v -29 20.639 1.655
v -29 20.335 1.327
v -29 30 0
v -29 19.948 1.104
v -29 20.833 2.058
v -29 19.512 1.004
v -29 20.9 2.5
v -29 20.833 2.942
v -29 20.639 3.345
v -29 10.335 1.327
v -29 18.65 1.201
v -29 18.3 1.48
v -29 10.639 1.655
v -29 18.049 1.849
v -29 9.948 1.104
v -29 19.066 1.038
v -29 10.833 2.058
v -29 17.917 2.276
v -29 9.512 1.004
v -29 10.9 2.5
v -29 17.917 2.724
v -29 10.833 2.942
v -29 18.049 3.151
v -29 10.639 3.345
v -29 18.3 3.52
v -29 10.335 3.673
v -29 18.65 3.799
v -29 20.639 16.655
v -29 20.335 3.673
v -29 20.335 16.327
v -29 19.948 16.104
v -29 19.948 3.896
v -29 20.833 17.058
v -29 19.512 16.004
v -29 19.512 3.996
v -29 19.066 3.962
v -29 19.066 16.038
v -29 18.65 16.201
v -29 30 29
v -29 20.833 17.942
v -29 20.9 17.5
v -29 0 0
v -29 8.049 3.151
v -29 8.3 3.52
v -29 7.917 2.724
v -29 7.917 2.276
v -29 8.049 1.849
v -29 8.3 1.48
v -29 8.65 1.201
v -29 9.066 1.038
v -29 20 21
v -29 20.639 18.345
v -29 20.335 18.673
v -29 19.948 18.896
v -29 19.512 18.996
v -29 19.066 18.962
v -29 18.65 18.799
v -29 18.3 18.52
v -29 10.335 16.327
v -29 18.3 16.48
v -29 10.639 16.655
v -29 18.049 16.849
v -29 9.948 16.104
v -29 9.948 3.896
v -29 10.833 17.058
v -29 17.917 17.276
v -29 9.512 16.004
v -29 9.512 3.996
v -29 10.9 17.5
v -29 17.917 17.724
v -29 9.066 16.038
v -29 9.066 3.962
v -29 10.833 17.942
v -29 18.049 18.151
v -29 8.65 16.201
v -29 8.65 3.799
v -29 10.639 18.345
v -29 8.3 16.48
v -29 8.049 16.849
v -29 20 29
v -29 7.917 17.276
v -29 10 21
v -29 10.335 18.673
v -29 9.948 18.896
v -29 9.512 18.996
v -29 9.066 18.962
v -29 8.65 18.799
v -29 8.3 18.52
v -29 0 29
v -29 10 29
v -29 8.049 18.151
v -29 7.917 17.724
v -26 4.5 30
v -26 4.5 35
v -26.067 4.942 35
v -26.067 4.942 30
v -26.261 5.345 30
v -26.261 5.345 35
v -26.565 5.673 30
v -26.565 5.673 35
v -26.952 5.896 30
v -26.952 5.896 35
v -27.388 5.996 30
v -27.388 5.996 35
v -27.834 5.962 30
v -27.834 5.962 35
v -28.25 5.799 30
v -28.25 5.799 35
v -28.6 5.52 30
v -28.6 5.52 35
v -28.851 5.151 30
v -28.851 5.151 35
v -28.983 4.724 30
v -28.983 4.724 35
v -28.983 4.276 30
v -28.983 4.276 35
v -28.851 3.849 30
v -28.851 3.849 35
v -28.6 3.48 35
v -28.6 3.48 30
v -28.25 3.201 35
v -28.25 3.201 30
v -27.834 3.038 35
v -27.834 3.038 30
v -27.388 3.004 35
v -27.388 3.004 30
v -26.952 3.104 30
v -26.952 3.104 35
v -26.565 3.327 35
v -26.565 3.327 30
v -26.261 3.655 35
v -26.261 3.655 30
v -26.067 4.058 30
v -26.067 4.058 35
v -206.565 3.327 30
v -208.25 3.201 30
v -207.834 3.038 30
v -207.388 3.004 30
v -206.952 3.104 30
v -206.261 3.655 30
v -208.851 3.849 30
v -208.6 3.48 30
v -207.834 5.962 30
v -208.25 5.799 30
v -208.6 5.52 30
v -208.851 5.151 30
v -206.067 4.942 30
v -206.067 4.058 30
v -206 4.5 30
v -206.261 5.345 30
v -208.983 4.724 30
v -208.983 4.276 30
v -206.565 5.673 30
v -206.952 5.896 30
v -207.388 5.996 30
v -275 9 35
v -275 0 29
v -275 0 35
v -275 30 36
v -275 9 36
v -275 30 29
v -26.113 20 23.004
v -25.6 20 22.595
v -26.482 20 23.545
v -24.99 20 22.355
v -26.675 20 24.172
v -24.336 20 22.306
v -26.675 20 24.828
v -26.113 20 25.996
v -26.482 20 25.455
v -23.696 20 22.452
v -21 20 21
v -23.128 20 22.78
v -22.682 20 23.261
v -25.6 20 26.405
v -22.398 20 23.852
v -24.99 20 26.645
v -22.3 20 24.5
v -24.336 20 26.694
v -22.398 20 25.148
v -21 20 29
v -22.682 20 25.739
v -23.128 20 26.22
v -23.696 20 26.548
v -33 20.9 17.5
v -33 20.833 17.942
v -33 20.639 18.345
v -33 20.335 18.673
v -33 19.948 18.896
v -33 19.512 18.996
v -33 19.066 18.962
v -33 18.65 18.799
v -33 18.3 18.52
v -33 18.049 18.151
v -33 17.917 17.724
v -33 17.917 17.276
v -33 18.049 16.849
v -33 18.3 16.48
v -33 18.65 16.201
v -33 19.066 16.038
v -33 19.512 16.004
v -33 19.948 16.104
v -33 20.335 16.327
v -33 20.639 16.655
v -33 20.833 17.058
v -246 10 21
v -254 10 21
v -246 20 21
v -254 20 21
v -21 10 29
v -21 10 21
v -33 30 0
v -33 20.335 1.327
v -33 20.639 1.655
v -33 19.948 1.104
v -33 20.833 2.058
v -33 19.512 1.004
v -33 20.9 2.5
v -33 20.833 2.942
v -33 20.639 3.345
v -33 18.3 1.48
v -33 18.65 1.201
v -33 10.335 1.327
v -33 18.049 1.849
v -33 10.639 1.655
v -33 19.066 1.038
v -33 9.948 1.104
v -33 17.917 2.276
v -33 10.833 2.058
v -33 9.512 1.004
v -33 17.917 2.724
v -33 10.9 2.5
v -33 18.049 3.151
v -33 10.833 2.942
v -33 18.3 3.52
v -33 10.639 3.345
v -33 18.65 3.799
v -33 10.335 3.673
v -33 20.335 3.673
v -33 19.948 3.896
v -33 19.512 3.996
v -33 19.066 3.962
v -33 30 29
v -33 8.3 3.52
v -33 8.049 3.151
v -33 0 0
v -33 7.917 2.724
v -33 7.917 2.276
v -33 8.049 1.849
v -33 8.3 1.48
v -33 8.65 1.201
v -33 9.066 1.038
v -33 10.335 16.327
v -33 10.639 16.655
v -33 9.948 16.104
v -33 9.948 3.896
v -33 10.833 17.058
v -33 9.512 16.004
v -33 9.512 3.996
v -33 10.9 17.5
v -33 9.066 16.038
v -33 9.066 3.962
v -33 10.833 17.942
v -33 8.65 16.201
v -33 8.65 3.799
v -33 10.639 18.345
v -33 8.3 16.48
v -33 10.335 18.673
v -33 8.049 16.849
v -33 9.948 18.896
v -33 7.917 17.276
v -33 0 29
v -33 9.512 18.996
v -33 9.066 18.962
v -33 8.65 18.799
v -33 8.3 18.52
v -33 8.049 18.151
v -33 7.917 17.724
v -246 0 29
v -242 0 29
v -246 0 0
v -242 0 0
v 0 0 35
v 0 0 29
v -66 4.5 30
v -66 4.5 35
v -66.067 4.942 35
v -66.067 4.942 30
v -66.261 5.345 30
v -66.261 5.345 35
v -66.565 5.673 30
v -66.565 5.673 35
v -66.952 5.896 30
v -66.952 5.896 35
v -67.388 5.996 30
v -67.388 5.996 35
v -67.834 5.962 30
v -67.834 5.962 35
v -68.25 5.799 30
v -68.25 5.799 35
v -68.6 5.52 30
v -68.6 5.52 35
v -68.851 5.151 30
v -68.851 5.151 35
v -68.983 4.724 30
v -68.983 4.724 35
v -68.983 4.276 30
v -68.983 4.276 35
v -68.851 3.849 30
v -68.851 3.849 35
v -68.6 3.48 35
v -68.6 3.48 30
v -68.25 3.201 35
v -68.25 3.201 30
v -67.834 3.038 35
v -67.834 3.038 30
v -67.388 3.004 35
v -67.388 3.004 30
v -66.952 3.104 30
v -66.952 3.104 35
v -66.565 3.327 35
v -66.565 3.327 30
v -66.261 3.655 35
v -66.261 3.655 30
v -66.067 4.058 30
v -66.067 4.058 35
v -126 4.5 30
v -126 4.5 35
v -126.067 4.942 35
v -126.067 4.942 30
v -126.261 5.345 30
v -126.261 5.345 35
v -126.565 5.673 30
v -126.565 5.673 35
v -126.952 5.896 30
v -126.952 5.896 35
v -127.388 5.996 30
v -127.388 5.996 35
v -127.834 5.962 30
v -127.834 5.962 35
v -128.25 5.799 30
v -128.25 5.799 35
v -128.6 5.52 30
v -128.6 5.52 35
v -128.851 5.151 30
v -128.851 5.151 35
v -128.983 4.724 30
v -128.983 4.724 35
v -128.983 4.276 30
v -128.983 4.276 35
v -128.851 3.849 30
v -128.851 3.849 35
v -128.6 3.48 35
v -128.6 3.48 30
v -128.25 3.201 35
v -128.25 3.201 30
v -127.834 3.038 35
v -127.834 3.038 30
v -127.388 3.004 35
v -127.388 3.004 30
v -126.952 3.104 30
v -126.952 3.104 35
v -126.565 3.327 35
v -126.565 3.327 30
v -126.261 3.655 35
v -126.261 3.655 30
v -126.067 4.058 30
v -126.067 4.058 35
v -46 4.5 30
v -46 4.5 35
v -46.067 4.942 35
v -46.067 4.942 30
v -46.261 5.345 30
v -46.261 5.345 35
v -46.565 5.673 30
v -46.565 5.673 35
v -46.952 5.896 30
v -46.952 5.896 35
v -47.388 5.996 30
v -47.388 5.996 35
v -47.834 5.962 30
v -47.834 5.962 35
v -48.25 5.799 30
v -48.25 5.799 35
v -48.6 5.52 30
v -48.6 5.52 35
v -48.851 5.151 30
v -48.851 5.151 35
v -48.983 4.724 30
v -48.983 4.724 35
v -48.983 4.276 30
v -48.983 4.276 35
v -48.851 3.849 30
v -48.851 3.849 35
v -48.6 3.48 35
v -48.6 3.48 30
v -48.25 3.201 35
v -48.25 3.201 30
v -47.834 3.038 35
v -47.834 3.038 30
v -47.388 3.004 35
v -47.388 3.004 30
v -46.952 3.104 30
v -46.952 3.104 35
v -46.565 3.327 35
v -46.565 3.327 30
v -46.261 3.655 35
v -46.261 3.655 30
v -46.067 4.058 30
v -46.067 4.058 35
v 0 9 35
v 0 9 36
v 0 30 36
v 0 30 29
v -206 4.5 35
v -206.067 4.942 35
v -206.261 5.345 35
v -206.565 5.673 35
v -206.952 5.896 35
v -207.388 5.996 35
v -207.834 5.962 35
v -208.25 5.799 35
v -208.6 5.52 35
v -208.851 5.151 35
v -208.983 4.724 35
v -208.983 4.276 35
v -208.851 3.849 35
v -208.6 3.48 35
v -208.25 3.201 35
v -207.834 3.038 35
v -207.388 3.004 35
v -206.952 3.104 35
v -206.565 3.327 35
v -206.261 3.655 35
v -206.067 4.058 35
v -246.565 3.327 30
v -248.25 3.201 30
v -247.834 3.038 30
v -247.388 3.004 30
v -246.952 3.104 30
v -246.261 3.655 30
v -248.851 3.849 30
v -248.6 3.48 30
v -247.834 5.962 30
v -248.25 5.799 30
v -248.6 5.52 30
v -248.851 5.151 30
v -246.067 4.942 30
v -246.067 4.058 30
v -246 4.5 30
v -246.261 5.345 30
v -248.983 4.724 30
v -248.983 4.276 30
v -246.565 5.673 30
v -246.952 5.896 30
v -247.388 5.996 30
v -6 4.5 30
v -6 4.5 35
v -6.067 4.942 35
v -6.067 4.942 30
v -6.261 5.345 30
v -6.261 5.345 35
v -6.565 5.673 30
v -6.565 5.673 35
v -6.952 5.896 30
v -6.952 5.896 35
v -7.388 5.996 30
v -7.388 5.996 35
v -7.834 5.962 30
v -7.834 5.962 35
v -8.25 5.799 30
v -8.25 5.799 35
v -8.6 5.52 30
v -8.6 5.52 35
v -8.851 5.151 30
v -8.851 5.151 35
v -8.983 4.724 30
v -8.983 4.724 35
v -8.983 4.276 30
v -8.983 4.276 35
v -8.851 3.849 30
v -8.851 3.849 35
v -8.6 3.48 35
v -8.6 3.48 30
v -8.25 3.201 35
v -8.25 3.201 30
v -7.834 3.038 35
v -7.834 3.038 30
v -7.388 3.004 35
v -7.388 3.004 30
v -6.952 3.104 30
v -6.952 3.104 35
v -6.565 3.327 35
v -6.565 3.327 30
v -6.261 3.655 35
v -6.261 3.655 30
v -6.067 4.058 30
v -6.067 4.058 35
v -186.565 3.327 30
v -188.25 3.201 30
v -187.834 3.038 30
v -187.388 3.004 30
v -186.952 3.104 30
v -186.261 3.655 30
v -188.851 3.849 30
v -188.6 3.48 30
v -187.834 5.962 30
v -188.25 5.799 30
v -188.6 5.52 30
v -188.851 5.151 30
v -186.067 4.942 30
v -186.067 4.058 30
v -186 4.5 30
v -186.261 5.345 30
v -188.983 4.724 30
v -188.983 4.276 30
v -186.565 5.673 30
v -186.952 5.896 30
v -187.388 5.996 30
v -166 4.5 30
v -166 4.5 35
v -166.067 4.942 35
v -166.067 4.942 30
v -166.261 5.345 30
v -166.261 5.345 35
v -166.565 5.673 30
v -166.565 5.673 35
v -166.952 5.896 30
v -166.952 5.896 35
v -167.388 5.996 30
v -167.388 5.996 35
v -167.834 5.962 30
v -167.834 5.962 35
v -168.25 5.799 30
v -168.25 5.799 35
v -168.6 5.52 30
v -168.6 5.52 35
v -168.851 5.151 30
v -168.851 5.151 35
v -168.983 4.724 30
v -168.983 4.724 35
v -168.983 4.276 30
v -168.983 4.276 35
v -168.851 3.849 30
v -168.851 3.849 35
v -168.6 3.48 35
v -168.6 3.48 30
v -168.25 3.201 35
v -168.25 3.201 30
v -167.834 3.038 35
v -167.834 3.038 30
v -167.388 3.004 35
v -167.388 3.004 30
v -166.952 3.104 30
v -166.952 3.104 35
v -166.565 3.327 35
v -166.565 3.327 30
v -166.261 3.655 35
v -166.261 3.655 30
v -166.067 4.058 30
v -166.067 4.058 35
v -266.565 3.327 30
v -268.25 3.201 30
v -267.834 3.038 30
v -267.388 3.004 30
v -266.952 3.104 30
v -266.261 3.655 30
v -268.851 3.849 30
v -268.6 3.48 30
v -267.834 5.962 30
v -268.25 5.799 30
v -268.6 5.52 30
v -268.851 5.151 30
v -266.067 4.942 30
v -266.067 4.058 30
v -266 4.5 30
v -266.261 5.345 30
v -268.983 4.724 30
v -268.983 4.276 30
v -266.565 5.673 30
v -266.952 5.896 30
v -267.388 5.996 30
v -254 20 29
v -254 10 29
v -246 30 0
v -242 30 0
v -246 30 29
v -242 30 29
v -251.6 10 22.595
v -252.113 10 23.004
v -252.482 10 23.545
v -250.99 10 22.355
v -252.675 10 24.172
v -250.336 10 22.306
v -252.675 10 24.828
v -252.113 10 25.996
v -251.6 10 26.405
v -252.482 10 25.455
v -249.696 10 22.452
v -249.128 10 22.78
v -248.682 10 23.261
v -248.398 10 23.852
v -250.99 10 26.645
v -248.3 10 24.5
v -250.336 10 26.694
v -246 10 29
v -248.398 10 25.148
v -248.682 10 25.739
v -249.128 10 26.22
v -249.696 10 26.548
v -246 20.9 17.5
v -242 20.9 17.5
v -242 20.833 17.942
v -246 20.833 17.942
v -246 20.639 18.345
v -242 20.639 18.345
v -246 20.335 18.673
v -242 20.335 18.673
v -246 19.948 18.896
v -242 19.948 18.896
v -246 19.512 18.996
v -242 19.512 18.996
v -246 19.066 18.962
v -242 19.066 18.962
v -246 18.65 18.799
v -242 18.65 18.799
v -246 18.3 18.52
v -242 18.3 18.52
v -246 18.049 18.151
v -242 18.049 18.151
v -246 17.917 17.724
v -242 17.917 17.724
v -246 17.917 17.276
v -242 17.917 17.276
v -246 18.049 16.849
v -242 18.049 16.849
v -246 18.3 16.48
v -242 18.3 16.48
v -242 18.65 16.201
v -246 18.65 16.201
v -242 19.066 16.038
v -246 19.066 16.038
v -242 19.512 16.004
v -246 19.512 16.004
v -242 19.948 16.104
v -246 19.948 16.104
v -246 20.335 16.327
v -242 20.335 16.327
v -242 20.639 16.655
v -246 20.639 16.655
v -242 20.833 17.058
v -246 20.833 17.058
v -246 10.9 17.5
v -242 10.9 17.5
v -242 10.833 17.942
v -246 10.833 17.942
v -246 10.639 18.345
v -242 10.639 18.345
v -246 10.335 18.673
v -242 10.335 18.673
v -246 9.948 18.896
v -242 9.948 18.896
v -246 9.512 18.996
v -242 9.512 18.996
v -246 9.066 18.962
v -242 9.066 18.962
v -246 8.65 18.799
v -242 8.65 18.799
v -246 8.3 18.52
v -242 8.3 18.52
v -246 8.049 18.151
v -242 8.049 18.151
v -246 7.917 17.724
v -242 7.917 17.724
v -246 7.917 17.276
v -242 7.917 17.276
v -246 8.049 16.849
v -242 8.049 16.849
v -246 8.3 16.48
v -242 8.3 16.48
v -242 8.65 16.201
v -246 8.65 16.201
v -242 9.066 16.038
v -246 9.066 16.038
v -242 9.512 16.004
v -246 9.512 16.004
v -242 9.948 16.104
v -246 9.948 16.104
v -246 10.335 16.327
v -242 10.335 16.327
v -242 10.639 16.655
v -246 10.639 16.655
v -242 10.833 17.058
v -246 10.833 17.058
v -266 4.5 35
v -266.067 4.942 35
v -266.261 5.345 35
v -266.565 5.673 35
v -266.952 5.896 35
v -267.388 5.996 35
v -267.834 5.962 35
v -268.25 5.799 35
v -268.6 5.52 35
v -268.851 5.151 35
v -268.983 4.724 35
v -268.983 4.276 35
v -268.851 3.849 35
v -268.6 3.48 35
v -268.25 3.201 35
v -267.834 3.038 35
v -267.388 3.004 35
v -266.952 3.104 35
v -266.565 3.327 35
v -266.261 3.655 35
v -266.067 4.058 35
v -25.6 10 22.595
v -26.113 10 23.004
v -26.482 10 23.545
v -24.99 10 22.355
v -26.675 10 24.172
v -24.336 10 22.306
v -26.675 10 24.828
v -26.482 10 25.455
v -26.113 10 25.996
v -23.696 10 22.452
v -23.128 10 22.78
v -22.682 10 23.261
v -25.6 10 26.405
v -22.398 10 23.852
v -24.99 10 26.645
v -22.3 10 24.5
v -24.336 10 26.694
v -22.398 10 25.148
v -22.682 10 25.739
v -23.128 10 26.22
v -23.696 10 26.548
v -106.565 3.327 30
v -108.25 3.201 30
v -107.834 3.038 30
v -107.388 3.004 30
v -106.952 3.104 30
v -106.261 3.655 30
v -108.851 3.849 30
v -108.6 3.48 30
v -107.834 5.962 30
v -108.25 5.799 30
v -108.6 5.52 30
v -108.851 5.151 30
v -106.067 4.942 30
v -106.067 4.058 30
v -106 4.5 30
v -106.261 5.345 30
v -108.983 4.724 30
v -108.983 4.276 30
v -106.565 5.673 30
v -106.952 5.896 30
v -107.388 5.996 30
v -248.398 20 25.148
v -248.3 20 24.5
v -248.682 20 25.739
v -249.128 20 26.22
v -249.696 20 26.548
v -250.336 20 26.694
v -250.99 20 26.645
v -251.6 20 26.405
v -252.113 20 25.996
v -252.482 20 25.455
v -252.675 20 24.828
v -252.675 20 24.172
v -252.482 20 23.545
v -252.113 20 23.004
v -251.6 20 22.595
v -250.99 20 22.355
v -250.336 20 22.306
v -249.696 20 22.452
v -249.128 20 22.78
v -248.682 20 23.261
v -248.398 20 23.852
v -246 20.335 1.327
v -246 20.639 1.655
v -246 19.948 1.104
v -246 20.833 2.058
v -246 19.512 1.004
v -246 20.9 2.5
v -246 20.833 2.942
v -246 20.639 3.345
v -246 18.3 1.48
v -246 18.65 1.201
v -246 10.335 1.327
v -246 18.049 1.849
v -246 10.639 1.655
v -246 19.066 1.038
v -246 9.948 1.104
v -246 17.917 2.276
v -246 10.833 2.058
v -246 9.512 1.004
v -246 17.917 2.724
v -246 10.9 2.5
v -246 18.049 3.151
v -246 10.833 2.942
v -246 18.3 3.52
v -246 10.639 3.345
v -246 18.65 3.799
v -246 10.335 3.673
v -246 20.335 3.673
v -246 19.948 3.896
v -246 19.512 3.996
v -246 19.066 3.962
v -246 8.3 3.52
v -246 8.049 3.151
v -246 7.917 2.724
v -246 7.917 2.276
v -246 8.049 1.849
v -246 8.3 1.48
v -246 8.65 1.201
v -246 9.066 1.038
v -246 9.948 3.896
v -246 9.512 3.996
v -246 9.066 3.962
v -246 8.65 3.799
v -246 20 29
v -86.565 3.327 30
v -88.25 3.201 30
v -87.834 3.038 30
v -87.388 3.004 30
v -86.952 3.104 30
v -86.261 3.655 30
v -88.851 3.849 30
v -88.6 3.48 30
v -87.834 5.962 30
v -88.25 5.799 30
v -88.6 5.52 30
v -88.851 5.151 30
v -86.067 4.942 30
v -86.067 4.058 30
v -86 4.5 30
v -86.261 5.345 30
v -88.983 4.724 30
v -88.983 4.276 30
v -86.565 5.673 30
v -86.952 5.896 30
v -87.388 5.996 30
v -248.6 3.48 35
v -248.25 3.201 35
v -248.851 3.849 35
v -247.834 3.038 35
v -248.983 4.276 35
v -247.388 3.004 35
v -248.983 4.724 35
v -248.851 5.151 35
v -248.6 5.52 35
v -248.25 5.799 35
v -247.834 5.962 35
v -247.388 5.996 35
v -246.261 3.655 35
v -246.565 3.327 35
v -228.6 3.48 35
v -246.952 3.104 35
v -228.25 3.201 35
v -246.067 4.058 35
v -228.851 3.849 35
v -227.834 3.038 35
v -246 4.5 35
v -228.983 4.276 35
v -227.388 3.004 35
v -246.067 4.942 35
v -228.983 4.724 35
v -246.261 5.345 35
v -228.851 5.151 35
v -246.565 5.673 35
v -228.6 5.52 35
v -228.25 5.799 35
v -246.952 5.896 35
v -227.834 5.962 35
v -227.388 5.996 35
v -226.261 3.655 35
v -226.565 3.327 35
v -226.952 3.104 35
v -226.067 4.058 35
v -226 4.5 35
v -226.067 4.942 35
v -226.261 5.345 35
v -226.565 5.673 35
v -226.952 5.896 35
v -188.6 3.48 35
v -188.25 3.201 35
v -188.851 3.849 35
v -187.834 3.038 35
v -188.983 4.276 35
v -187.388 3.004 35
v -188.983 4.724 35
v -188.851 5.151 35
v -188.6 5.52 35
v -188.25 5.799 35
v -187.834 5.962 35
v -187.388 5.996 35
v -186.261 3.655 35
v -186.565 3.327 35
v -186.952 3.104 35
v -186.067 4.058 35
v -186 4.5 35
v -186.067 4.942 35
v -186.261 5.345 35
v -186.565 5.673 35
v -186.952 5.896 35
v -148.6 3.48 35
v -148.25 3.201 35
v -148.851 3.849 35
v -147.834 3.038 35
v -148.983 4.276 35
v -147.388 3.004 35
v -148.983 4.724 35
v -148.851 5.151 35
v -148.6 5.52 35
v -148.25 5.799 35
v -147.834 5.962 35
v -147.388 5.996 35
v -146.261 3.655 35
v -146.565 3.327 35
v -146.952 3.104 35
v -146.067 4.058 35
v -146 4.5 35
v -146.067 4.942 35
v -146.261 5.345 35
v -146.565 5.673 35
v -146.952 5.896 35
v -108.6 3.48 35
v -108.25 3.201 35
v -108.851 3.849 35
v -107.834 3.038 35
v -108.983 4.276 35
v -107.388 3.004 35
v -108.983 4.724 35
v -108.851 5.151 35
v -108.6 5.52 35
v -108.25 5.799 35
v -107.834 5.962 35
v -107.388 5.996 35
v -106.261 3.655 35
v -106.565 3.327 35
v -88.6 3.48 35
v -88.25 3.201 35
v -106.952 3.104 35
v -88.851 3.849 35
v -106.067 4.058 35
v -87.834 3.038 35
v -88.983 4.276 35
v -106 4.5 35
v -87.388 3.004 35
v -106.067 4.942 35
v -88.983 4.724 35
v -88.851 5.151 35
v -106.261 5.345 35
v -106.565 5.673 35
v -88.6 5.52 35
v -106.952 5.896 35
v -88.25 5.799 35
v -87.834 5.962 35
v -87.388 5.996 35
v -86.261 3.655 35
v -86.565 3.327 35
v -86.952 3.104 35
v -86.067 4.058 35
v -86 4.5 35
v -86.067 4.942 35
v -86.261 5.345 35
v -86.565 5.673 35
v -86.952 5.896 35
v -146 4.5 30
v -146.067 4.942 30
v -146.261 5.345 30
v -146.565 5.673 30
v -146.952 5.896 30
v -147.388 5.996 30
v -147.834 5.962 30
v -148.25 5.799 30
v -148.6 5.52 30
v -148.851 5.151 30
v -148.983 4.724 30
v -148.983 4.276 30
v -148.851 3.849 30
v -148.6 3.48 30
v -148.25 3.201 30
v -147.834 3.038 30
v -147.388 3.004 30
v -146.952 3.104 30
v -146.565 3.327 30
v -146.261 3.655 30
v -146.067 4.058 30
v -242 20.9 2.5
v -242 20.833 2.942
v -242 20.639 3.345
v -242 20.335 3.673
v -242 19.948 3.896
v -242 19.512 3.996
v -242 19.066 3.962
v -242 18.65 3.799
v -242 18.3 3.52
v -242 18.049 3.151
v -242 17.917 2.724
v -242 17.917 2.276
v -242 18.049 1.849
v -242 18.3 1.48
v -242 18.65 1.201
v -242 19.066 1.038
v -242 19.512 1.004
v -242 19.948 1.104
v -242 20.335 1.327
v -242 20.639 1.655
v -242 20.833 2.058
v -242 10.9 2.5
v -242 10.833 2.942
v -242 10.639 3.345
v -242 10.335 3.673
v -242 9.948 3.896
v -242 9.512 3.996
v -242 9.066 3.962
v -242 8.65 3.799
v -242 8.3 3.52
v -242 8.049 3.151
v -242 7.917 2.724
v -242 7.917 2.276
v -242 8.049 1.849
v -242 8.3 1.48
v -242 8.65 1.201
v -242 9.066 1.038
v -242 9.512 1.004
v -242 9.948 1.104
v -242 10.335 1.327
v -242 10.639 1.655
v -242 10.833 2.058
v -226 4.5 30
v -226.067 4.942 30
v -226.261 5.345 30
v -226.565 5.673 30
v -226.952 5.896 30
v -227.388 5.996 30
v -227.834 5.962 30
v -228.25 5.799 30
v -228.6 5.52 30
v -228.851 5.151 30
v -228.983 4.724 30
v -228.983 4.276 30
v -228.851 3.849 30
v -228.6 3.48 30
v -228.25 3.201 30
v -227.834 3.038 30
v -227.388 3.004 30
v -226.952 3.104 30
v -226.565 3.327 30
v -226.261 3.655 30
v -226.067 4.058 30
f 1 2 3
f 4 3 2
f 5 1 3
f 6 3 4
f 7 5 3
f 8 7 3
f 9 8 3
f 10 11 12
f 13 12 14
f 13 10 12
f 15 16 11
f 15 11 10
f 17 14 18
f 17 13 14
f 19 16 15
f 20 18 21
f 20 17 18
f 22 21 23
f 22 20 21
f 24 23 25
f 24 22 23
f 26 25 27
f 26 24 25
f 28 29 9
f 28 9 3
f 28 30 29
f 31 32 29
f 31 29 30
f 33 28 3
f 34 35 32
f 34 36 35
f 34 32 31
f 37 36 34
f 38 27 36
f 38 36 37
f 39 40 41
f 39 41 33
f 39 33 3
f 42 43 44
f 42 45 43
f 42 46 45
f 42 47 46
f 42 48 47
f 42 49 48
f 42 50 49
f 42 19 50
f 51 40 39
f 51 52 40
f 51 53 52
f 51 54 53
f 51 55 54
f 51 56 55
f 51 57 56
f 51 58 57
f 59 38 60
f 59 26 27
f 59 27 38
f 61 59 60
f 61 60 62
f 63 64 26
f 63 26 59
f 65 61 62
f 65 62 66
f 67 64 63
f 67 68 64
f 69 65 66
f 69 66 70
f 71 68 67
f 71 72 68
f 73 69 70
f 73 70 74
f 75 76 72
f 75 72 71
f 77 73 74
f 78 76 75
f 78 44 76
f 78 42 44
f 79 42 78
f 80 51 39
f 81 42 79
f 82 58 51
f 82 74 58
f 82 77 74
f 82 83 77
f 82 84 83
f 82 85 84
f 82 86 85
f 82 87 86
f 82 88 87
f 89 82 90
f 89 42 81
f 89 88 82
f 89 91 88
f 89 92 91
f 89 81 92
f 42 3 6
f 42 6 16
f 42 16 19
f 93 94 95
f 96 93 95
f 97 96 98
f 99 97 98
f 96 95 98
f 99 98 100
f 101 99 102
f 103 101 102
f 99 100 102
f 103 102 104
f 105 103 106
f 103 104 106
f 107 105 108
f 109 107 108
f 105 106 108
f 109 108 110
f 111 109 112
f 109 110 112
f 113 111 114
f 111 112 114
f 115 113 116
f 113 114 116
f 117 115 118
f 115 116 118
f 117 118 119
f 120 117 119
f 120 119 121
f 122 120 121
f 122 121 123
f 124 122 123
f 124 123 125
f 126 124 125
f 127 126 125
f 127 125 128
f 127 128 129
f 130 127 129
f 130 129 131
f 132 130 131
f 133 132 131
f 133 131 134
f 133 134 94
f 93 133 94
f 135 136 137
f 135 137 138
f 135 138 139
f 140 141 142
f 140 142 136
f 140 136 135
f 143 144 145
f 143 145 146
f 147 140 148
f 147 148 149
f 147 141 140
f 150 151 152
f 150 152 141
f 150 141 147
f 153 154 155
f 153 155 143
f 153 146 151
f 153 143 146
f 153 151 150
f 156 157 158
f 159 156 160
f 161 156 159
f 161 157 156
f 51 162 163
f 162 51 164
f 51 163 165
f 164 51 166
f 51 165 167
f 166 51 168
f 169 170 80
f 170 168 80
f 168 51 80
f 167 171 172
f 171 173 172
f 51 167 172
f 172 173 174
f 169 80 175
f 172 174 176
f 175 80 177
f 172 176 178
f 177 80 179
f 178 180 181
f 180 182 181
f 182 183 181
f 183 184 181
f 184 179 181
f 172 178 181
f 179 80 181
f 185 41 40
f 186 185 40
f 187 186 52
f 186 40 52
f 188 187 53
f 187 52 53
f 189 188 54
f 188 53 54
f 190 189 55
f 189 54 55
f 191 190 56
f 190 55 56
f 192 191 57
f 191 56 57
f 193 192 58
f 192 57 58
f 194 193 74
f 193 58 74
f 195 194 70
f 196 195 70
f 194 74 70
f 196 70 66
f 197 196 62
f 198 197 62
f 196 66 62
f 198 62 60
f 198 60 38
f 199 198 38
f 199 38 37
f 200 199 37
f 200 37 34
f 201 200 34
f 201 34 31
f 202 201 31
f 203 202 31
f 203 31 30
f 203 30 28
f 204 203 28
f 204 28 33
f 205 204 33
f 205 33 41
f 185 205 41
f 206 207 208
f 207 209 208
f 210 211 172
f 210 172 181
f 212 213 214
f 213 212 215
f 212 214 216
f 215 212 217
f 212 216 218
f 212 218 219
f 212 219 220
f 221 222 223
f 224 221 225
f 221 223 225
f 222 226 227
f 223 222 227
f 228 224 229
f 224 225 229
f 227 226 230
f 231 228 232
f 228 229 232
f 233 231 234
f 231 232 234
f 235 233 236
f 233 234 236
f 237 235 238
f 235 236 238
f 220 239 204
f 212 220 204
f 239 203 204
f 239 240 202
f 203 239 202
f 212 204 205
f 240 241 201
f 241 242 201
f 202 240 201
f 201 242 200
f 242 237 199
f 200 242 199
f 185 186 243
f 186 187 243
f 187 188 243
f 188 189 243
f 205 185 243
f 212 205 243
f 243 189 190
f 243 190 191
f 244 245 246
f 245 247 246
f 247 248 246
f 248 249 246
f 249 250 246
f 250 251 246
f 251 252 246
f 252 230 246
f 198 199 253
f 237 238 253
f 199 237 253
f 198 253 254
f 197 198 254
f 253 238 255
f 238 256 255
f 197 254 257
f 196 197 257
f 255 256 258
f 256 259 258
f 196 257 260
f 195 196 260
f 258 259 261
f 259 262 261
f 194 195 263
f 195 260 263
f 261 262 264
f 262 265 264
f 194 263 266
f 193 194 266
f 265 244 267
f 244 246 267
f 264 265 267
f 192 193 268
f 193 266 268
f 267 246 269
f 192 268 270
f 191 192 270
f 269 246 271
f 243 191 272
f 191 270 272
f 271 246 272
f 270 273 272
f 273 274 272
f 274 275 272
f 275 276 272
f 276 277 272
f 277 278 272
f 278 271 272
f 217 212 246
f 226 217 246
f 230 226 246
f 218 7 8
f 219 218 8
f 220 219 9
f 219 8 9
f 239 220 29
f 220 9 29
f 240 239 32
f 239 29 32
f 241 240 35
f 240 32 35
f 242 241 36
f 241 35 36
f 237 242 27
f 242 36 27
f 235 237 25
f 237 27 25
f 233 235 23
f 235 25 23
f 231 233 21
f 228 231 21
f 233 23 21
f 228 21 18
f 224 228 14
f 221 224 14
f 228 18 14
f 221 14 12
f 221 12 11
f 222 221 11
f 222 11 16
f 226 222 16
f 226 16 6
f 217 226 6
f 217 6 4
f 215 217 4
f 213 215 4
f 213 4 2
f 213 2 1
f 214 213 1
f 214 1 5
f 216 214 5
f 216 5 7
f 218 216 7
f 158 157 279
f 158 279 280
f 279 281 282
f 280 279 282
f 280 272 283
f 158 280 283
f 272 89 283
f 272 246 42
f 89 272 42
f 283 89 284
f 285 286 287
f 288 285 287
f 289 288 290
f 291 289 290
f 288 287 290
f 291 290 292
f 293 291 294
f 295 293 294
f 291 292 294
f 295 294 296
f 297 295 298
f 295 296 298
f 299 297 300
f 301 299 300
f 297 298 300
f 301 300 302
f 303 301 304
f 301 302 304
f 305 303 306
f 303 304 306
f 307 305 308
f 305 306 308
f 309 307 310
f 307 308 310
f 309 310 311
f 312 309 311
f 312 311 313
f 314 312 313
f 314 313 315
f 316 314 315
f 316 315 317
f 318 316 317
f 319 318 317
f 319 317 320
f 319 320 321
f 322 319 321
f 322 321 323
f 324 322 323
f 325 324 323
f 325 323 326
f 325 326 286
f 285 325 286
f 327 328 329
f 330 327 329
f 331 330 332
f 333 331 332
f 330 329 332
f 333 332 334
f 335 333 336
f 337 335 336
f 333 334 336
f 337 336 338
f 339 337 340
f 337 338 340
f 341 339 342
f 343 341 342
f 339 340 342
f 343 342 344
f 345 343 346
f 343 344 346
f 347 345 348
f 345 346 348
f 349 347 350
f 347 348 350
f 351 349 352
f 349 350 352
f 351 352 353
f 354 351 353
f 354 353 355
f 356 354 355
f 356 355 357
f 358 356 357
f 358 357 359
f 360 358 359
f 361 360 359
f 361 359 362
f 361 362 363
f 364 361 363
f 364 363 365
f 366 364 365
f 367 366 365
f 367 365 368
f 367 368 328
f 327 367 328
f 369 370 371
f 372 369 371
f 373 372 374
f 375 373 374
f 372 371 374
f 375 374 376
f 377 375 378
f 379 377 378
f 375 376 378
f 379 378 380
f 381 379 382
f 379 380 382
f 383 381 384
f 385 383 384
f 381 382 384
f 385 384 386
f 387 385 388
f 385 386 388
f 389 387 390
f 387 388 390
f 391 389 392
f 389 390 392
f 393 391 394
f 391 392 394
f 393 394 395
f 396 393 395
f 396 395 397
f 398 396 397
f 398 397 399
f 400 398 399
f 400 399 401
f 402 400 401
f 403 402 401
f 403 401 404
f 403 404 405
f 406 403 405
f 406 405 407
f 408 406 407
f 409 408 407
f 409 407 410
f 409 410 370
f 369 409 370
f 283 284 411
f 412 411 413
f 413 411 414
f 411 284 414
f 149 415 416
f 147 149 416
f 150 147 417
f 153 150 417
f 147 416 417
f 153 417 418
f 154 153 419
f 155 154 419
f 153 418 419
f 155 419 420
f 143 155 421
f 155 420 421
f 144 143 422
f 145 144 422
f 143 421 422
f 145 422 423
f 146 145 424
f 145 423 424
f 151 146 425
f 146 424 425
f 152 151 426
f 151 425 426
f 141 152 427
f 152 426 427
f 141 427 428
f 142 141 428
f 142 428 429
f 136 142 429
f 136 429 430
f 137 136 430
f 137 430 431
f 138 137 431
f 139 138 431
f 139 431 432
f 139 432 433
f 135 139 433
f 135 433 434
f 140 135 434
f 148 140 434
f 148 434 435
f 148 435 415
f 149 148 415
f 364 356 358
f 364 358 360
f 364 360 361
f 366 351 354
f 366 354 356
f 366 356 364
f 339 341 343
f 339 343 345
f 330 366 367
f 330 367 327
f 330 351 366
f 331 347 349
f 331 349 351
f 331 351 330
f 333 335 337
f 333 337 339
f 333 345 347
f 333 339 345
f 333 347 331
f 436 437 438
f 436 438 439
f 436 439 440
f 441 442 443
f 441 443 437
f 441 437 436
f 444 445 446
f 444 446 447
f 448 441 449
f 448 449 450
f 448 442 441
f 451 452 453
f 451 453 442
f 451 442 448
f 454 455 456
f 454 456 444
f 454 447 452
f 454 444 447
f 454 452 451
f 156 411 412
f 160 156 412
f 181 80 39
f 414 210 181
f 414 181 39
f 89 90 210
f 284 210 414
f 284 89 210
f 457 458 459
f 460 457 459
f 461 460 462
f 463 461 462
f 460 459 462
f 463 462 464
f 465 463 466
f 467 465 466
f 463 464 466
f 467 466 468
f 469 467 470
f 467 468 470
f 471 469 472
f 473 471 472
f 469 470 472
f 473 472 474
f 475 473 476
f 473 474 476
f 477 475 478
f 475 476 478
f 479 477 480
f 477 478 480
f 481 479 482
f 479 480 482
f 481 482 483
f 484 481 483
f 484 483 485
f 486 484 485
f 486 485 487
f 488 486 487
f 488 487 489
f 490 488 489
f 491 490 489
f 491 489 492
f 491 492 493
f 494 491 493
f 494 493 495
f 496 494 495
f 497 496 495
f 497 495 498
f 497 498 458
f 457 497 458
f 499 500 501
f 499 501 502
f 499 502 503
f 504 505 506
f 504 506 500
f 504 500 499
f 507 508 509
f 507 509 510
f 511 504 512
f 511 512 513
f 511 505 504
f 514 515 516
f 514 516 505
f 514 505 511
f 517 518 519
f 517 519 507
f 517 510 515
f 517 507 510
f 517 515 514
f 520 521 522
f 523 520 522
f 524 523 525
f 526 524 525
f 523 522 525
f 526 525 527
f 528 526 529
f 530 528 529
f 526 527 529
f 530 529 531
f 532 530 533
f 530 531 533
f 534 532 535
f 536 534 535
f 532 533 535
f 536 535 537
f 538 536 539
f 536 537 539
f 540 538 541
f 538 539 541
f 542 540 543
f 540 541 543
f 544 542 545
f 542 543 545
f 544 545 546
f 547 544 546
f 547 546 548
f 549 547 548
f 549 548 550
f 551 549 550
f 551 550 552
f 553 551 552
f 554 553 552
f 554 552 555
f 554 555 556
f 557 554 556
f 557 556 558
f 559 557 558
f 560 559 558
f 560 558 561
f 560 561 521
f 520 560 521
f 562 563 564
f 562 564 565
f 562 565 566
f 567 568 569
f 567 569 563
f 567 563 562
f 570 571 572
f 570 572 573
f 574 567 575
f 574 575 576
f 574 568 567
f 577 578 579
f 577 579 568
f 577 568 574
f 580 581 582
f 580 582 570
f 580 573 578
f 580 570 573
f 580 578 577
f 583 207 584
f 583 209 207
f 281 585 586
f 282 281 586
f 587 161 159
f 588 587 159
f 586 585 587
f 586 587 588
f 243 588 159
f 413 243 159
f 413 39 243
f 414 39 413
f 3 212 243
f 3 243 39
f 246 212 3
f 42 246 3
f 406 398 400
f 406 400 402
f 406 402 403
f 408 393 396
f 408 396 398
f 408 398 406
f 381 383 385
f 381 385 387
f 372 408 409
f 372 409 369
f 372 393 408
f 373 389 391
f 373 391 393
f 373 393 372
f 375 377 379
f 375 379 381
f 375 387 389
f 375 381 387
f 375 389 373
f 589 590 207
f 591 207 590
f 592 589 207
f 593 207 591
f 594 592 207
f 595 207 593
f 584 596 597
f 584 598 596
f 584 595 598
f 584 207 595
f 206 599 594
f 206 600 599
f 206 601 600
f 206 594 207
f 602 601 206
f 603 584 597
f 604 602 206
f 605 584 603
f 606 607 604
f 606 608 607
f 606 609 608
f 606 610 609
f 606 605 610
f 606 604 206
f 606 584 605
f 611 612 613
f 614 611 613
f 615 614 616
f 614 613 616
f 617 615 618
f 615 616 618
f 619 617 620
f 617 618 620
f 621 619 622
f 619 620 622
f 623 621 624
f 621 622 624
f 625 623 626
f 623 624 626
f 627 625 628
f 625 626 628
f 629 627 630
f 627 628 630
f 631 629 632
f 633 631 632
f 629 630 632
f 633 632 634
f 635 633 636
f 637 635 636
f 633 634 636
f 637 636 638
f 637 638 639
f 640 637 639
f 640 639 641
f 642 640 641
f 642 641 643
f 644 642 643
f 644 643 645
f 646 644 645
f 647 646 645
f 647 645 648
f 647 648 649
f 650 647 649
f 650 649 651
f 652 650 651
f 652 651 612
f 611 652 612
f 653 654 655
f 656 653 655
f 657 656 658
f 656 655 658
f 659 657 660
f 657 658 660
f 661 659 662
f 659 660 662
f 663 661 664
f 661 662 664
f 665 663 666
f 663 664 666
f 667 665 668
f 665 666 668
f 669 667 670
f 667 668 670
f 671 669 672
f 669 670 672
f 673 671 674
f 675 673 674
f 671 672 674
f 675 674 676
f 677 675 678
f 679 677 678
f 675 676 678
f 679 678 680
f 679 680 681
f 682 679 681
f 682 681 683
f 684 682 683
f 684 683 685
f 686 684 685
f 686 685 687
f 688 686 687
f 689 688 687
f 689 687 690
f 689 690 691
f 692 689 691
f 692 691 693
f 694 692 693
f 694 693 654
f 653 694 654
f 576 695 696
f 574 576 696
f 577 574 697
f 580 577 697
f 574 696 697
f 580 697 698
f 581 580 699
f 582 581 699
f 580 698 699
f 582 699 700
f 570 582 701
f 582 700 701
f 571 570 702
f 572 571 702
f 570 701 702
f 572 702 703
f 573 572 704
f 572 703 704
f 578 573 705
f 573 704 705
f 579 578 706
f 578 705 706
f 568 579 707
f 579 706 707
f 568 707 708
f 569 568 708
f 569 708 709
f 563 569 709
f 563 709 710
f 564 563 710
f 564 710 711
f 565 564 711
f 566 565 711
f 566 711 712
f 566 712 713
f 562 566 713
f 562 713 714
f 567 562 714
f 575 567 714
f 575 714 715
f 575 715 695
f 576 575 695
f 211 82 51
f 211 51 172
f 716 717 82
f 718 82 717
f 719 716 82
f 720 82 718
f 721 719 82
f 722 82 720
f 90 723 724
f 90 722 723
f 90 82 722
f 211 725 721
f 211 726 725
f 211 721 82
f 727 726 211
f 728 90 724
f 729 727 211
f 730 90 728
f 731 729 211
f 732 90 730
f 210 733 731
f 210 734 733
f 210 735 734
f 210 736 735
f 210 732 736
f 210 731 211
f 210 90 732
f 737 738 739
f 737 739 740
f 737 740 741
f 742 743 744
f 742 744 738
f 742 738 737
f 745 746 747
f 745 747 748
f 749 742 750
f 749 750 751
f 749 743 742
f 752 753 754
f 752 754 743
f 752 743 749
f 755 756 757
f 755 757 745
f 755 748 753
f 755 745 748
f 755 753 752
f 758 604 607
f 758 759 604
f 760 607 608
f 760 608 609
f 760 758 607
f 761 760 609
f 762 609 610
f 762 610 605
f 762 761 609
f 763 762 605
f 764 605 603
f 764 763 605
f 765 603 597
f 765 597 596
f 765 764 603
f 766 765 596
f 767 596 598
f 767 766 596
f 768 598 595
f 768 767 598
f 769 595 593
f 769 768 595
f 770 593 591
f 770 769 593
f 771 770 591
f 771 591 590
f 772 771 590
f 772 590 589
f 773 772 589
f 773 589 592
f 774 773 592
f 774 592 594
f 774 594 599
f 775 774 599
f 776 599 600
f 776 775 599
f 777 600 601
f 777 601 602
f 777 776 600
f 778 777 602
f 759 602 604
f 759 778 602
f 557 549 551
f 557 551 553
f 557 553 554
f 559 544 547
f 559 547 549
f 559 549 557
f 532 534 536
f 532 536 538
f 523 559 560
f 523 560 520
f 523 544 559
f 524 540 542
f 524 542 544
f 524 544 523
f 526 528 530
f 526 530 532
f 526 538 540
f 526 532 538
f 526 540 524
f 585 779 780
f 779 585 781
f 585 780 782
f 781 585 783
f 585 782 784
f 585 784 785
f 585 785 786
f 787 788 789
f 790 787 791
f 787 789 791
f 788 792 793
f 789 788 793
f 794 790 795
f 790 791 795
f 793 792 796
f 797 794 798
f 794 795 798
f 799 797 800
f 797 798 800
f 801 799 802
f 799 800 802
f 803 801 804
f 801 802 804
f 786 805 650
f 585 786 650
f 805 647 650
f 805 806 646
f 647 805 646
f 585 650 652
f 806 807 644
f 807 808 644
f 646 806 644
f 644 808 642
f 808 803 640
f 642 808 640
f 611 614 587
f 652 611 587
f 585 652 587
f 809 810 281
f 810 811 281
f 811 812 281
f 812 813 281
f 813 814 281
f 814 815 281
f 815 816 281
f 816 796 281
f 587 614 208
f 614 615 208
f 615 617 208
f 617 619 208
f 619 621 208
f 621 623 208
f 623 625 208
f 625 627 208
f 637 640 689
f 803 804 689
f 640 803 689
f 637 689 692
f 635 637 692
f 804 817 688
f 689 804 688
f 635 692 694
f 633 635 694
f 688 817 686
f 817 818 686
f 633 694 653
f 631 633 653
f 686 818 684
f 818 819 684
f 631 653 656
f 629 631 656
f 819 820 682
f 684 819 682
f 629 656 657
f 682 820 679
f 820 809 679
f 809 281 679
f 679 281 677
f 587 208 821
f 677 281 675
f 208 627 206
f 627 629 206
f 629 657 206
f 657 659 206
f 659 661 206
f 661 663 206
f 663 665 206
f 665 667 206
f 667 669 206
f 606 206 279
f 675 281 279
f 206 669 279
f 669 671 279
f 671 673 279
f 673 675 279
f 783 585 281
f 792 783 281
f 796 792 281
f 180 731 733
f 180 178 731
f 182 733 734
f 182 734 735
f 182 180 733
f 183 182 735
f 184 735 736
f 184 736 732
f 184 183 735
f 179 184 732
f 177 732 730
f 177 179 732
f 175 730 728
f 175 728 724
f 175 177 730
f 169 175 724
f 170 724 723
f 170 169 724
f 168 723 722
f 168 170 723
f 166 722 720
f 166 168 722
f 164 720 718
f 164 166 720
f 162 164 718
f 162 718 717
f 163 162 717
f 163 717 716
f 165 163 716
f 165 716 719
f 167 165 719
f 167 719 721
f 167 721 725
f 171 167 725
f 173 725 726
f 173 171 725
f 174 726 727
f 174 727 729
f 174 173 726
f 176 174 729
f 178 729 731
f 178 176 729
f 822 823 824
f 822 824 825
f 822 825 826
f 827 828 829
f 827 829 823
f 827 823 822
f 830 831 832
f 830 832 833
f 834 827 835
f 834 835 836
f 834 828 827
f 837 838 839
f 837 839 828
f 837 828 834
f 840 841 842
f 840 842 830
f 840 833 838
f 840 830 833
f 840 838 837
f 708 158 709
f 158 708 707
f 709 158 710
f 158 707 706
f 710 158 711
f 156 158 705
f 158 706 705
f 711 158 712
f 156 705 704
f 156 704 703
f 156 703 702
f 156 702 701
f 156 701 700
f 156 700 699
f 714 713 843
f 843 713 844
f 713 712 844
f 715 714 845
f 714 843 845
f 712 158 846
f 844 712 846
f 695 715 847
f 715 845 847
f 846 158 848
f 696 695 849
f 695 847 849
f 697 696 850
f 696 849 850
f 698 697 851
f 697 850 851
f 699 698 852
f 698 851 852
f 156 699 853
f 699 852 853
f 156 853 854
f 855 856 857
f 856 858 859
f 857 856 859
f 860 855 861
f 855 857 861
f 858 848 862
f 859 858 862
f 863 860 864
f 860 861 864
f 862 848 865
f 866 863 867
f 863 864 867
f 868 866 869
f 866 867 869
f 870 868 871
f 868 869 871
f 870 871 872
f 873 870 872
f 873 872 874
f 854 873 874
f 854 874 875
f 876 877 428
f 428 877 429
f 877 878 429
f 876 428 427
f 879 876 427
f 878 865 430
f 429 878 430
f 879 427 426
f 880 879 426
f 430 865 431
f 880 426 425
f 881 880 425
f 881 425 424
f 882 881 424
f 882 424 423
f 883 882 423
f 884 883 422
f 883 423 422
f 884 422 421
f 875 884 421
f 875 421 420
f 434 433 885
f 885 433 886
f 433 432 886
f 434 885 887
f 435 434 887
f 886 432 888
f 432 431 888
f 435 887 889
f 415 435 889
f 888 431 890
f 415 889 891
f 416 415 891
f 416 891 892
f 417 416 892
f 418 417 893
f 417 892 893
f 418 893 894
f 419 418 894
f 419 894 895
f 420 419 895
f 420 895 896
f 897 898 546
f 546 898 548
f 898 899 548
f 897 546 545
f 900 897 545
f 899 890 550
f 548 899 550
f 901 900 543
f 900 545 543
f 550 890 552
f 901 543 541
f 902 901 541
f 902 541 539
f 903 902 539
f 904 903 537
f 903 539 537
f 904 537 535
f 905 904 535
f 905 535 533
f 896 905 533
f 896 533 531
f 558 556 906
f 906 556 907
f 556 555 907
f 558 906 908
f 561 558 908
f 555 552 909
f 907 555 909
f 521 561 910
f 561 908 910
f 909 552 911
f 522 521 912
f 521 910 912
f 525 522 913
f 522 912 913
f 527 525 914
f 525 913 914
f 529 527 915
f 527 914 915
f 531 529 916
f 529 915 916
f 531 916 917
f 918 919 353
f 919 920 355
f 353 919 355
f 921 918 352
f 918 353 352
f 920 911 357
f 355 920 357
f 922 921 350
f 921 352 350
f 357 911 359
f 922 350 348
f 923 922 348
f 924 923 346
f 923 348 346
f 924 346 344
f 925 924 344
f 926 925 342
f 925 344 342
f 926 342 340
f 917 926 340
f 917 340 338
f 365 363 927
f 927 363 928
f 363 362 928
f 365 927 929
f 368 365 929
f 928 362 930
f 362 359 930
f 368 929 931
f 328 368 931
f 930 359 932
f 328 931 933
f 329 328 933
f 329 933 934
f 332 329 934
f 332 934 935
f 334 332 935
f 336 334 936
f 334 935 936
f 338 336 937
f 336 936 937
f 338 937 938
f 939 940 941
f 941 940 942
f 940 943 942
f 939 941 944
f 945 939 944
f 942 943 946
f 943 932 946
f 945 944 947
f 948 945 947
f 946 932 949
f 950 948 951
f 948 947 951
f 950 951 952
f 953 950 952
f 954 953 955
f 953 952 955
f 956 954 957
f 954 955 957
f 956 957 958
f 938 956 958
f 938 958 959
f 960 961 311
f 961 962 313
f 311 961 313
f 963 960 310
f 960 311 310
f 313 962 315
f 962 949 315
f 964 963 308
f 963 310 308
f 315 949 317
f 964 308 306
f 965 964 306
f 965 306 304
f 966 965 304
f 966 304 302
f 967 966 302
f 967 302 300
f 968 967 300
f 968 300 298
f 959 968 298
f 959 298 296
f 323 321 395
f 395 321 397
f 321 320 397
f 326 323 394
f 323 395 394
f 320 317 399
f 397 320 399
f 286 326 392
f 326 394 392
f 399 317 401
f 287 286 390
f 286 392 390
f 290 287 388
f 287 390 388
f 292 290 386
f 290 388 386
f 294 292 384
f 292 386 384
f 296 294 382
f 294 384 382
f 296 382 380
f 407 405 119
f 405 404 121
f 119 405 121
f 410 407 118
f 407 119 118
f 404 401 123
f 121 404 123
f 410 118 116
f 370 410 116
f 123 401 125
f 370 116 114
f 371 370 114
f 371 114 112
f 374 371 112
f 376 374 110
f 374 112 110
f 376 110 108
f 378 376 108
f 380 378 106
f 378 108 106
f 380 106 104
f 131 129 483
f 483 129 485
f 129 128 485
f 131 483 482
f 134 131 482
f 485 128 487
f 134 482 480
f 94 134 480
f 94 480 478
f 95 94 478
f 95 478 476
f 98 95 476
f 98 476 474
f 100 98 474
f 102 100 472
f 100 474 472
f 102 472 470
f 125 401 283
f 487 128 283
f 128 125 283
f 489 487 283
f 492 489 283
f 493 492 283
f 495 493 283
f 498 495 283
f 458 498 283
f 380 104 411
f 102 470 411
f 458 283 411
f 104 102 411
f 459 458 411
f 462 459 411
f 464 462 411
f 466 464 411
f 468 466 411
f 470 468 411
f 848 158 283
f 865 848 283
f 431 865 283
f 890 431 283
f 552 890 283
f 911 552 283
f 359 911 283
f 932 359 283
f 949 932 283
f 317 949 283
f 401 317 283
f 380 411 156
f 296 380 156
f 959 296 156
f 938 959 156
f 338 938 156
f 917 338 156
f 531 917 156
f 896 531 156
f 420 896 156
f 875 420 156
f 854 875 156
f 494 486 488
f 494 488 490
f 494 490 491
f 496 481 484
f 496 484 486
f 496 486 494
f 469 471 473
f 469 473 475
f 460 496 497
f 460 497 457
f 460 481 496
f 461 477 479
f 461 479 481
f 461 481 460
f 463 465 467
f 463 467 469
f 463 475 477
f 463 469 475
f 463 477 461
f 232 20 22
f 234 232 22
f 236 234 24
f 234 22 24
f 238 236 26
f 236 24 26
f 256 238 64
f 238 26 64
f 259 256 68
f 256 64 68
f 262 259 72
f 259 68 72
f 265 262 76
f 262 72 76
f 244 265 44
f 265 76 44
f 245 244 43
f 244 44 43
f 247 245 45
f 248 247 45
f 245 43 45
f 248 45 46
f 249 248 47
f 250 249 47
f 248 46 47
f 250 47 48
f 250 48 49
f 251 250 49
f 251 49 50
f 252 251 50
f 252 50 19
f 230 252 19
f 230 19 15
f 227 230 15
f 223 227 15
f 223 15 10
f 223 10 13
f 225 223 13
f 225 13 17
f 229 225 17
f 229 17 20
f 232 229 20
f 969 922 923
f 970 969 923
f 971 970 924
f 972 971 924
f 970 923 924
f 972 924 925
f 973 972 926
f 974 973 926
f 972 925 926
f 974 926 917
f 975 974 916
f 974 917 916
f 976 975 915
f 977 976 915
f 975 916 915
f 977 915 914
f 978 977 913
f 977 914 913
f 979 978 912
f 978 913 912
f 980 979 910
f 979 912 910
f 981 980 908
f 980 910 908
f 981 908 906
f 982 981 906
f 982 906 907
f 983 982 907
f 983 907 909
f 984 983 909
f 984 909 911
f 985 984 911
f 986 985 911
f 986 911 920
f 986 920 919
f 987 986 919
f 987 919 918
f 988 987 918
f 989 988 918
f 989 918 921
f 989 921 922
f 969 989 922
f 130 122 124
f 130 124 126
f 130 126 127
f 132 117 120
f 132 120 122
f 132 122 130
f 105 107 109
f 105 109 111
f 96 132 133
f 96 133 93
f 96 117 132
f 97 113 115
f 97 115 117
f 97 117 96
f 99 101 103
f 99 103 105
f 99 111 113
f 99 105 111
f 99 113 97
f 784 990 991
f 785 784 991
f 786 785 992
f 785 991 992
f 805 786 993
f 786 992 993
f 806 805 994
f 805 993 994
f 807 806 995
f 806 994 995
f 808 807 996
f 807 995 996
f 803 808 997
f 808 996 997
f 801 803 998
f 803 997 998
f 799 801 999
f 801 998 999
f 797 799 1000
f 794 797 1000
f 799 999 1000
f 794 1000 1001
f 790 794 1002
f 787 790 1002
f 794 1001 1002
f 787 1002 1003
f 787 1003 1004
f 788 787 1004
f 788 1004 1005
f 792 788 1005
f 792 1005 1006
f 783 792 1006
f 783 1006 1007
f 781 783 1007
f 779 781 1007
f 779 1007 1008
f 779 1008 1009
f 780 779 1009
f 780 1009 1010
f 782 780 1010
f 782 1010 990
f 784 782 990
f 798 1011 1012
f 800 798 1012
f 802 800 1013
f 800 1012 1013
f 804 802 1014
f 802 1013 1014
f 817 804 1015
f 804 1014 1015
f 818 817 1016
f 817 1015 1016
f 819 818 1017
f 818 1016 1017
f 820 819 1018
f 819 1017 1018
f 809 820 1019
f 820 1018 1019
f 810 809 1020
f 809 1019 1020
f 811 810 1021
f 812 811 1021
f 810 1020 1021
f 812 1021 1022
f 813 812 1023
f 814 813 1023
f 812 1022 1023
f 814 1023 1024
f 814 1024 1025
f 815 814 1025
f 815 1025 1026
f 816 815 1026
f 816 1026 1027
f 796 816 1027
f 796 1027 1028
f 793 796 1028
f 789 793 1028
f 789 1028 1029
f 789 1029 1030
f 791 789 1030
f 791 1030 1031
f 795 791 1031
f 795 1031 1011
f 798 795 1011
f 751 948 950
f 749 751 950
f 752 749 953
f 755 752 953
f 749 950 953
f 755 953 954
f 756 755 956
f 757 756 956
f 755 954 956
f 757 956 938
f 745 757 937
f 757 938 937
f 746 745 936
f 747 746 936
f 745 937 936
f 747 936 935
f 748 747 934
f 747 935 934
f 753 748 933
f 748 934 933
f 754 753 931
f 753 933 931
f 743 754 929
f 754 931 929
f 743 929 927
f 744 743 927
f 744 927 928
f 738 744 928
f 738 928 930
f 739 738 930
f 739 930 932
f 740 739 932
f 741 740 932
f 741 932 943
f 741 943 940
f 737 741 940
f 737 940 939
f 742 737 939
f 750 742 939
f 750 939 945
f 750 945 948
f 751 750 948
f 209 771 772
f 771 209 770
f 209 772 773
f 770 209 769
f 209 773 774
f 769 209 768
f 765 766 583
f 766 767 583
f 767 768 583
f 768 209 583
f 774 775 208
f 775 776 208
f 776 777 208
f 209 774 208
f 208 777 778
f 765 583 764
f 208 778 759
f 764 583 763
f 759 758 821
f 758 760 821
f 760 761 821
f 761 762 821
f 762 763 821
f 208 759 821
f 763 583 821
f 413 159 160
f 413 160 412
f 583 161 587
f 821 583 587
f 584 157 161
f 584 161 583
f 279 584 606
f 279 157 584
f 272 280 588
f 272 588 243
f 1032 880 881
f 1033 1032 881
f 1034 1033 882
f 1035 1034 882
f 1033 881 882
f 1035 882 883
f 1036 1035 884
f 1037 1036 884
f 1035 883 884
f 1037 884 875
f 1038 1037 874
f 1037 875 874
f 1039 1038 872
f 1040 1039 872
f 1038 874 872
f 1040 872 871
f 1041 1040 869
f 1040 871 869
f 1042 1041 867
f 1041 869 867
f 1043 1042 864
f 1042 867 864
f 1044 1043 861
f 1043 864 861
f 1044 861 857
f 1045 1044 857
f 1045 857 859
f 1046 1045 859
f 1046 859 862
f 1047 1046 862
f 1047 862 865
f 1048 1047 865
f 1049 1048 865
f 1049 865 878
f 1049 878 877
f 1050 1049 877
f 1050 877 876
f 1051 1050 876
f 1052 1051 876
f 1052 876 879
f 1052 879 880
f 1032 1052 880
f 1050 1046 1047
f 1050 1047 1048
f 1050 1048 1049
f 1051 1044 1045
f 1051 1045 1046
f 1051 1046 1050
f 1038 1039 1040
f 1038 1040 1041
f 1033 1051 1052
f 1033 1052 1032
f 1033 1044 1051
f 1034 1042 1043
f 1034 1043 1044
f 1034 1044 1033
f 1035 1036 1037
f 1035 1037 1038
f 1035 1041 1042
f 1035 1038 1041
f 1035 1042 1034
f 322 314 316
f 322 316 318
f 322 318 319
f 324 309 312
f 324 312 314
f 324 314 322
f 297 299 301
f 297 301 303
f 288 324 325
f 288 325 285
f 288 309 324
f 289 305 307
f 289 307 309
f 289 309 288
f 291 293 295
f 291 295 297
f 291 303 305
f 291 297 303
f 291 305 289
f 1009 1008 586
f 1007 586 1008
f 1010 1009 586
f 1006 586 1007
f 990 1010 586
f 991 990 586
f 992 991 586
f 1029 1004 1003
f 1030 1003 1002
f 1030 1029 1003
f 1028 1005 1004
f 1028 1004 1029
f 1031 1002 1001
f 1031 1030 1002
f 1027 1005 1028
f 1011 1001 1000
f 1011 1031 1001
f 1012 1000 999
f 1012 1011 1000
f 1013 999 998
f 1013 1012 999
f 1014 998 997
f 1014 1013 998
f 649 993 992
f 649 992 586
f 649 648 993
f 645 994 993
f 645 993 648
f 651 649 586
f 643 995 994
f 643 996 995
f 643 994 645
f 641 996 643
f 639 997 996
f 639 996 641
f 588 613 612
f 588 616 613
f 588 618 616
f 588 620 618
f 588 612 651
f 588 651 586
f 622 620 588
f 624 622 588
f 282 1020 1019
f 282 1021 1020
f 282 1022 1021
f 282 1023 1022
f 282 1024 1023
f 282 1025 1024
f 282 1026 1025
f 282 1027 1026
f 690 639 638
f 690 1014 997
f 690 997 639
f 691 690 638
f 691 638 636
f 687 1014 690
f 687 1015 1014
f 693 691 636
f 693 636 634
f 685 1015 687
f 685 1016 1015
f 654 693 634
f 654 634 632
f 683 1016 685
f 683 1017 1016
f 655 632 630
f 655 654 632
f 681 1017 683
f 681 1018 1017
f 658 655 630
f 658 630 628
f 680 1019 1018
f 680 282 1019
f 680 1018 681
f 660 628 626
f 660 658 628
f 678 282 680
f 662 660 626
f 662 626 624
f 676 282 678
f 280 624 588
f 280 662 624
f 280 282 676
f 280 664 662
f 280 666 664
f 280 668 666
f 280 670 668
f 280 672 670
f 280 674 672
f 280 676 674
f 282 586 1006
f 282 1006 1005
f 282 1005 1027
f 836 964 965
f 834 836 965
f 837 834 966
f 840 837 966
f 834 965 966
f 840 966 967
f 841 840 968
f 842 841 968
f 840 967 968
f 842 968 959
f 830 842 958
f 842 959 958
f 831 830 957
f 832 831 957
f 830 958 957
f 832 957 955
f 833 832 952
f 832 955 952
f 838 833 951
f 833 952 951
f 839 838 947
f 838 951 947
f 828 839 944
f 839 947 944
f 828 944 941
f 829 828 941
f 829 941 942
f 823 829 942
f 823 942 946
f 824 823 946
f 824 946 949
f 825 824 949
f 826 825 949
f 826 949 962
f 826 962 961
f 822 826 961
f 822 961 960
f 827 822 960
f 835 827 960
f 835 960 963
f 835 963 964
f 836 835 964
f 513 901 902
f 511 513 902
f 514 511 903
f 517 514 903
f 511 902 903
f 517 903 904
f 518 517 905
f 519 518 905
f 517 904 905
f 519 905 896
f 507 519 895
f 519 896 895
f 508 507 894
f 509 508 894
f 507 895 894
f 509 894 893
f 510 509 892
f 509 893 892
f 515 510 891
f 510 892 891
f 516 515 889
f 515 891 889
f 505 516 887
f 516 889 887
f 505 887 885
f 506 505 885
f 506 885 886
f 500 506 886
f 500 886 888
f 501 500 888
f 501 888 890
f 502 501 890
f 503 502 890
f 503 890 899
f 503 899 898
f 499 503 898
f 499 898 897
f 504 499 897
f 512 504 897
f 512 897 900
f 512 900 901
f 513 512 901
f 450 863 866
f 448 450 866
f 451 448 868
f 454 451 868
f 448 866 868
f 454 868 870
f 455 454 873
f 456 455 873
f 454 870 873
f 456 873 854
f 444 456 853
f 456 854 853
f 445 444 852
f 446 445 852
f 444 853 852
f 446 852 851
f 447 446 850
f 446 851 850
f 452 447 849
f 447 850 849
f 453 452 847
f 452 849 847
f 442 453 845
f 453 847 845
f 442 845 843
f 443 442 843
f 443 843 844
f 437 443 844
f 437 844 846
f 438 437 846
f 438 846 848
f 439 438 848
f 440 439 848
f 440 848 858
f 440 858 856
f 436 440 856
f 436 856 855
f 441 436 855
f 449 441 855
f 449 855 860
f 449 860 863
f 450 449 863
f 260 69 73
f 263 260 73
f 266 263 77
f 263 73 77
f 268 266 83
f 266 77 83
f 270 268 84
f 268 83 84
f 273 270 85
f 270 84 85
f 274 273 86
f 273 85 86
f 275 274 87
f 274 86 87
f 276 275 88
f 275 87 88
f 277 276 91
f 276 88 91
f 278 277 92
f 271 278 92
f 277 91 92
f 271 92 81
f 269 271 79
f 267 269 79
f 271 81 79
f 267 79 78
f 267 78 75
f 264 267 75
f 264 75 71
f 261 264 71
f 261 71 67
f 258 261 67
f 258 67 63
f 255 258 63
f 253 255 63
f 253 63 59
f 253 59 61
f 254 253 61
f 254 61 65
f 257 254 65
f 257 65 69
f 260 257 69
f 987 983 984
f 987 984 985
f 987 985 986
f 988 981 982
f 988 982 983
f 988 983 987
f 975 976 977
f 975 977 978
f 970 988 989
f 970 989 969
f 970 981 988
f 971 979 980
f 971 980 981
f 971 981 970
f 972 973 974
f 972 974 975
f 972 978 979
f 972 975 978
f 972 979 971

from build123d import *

# Parameters (mm, degrees)
SKETCH007_W            = 275
SKETCH007_H            = 30
PAD003_DEPTH           = 36
SKETCH008_W            = 9
SKETCH008_H            = 1
POCKET004_DEPTH        = 275
SKETCH009_R            = 1.5
POCKET005_DEPTH        = 6
LINEARPATTERN001_COUNT = 14
LINEARPATTERN001_PITCH = 20
SKETCH017_W            = 29
SKETCH017_H            = 29
SKETCH017_W_2          = 209
POCKET010_DEPTH        = 30
SKETCH018_R            = 1.5
POCKET011_DEPTH        = 275
SKETCH062_W            = 8
SKETCH062_H            = 8
SKETCH062_R            = 2.2
PAD020_DEPTH           = 5


with BuildPart() as part:
    # Sketch007 → Pad003 (new body)
    with BuildSketch(Plane.XY):
        with Locations((-137.5, 15)):
            Rectangle(SKETCH007_W, SKETCH007_H)
    extrude(amount=PAD003_DEPTH)

    # Sketch008 (on Face2 of Pad003) → Pocket004 (cut)
    with BuildSketch(Plane.YZ):
        with Locations((4.5, 35.5)):
            Rectangle(SKETCH008_W, SKETCH008_H)
    extrude(amount=-POCKET004_DEPTH, mode=Mode.SUBTRACT)

    # Sketch009 (on Face5 of Pocket004) → Pocket005 (cut)
    with BuildSketch(Plane.XY.offset(36)):
        with Locations((-7.5, 4.5)):
            Circle(SKETCH009_R)
    pocket005 = extrude(amount=-POCKET005_DEPTH, mode=Mode.SUBTRACT)

    # LinearPattern001: Pocket005 ×14
    with Locations(*[(-i * LINEARPATTERN001_PITCH, 0, 0) for i in range(1, LINEARPATTERN001_COUNT)]):
        add(pocket005, mode=Mode.SUBTRACT)

    # Sketch017 → Pocket010 (cut)
    with BuildSketch(Plane.XZ):
        with Locations((-14.5, 14.5)):
            Rectangle(SKETCH017_W, SKETCH017_H)
        with Locations((-260.5, 14.5)):
            Rectangle(SKETCH017_W, SKETCH017_H)
        with Locations((-137.5, 14.5)):
            Rectangle(SKETCH017_W_2, SKETCH017_H)
    extrude(amount=-POCKET010_DEPTH, mode=Mode.SUBTRACT)

    # Sketch018 → Pocket011 (cut)
    with BuildSketch(Plane.YZ):
        with Locations((9.4, 17.5)):
            Circle(SKETCH018_R)
        with Locations((19.4, 17.5)):
            Circle(SKETCH018_R)
        with Locations((9.4, 2.5)):
            Circle(SKETCH018_R)
        with Locations((19.4, 2.5)):
            Circle(SKETCH018_R)
    extrude(amount=-POCKET011_DEPTH, mode=Mode.SUBTRACT)

    # Sketch062 → Pad020 (join, symmetric)
    with BuildSketch(Plane.XZ.offset(-15)):
        with Locations((-250, 25)):
            Rectangle(SKETCH062_W, SKETCH062_H)
        with Locations((-250.5, 24.5)):
            Circle(SKETCH062_R, mode=Mode.SUBTRACT)
        with Locations((-25, 25)):
            Rectangle(SKETCH062_W, SKETCH062_H)
        with Locations((-24.5, 24.5)):
            Circle(SKETCH062_R, mode=Mode.SUBTRACT)
    extrude(amount=PAD020_DEPTH, both=True)


solid = part.part
